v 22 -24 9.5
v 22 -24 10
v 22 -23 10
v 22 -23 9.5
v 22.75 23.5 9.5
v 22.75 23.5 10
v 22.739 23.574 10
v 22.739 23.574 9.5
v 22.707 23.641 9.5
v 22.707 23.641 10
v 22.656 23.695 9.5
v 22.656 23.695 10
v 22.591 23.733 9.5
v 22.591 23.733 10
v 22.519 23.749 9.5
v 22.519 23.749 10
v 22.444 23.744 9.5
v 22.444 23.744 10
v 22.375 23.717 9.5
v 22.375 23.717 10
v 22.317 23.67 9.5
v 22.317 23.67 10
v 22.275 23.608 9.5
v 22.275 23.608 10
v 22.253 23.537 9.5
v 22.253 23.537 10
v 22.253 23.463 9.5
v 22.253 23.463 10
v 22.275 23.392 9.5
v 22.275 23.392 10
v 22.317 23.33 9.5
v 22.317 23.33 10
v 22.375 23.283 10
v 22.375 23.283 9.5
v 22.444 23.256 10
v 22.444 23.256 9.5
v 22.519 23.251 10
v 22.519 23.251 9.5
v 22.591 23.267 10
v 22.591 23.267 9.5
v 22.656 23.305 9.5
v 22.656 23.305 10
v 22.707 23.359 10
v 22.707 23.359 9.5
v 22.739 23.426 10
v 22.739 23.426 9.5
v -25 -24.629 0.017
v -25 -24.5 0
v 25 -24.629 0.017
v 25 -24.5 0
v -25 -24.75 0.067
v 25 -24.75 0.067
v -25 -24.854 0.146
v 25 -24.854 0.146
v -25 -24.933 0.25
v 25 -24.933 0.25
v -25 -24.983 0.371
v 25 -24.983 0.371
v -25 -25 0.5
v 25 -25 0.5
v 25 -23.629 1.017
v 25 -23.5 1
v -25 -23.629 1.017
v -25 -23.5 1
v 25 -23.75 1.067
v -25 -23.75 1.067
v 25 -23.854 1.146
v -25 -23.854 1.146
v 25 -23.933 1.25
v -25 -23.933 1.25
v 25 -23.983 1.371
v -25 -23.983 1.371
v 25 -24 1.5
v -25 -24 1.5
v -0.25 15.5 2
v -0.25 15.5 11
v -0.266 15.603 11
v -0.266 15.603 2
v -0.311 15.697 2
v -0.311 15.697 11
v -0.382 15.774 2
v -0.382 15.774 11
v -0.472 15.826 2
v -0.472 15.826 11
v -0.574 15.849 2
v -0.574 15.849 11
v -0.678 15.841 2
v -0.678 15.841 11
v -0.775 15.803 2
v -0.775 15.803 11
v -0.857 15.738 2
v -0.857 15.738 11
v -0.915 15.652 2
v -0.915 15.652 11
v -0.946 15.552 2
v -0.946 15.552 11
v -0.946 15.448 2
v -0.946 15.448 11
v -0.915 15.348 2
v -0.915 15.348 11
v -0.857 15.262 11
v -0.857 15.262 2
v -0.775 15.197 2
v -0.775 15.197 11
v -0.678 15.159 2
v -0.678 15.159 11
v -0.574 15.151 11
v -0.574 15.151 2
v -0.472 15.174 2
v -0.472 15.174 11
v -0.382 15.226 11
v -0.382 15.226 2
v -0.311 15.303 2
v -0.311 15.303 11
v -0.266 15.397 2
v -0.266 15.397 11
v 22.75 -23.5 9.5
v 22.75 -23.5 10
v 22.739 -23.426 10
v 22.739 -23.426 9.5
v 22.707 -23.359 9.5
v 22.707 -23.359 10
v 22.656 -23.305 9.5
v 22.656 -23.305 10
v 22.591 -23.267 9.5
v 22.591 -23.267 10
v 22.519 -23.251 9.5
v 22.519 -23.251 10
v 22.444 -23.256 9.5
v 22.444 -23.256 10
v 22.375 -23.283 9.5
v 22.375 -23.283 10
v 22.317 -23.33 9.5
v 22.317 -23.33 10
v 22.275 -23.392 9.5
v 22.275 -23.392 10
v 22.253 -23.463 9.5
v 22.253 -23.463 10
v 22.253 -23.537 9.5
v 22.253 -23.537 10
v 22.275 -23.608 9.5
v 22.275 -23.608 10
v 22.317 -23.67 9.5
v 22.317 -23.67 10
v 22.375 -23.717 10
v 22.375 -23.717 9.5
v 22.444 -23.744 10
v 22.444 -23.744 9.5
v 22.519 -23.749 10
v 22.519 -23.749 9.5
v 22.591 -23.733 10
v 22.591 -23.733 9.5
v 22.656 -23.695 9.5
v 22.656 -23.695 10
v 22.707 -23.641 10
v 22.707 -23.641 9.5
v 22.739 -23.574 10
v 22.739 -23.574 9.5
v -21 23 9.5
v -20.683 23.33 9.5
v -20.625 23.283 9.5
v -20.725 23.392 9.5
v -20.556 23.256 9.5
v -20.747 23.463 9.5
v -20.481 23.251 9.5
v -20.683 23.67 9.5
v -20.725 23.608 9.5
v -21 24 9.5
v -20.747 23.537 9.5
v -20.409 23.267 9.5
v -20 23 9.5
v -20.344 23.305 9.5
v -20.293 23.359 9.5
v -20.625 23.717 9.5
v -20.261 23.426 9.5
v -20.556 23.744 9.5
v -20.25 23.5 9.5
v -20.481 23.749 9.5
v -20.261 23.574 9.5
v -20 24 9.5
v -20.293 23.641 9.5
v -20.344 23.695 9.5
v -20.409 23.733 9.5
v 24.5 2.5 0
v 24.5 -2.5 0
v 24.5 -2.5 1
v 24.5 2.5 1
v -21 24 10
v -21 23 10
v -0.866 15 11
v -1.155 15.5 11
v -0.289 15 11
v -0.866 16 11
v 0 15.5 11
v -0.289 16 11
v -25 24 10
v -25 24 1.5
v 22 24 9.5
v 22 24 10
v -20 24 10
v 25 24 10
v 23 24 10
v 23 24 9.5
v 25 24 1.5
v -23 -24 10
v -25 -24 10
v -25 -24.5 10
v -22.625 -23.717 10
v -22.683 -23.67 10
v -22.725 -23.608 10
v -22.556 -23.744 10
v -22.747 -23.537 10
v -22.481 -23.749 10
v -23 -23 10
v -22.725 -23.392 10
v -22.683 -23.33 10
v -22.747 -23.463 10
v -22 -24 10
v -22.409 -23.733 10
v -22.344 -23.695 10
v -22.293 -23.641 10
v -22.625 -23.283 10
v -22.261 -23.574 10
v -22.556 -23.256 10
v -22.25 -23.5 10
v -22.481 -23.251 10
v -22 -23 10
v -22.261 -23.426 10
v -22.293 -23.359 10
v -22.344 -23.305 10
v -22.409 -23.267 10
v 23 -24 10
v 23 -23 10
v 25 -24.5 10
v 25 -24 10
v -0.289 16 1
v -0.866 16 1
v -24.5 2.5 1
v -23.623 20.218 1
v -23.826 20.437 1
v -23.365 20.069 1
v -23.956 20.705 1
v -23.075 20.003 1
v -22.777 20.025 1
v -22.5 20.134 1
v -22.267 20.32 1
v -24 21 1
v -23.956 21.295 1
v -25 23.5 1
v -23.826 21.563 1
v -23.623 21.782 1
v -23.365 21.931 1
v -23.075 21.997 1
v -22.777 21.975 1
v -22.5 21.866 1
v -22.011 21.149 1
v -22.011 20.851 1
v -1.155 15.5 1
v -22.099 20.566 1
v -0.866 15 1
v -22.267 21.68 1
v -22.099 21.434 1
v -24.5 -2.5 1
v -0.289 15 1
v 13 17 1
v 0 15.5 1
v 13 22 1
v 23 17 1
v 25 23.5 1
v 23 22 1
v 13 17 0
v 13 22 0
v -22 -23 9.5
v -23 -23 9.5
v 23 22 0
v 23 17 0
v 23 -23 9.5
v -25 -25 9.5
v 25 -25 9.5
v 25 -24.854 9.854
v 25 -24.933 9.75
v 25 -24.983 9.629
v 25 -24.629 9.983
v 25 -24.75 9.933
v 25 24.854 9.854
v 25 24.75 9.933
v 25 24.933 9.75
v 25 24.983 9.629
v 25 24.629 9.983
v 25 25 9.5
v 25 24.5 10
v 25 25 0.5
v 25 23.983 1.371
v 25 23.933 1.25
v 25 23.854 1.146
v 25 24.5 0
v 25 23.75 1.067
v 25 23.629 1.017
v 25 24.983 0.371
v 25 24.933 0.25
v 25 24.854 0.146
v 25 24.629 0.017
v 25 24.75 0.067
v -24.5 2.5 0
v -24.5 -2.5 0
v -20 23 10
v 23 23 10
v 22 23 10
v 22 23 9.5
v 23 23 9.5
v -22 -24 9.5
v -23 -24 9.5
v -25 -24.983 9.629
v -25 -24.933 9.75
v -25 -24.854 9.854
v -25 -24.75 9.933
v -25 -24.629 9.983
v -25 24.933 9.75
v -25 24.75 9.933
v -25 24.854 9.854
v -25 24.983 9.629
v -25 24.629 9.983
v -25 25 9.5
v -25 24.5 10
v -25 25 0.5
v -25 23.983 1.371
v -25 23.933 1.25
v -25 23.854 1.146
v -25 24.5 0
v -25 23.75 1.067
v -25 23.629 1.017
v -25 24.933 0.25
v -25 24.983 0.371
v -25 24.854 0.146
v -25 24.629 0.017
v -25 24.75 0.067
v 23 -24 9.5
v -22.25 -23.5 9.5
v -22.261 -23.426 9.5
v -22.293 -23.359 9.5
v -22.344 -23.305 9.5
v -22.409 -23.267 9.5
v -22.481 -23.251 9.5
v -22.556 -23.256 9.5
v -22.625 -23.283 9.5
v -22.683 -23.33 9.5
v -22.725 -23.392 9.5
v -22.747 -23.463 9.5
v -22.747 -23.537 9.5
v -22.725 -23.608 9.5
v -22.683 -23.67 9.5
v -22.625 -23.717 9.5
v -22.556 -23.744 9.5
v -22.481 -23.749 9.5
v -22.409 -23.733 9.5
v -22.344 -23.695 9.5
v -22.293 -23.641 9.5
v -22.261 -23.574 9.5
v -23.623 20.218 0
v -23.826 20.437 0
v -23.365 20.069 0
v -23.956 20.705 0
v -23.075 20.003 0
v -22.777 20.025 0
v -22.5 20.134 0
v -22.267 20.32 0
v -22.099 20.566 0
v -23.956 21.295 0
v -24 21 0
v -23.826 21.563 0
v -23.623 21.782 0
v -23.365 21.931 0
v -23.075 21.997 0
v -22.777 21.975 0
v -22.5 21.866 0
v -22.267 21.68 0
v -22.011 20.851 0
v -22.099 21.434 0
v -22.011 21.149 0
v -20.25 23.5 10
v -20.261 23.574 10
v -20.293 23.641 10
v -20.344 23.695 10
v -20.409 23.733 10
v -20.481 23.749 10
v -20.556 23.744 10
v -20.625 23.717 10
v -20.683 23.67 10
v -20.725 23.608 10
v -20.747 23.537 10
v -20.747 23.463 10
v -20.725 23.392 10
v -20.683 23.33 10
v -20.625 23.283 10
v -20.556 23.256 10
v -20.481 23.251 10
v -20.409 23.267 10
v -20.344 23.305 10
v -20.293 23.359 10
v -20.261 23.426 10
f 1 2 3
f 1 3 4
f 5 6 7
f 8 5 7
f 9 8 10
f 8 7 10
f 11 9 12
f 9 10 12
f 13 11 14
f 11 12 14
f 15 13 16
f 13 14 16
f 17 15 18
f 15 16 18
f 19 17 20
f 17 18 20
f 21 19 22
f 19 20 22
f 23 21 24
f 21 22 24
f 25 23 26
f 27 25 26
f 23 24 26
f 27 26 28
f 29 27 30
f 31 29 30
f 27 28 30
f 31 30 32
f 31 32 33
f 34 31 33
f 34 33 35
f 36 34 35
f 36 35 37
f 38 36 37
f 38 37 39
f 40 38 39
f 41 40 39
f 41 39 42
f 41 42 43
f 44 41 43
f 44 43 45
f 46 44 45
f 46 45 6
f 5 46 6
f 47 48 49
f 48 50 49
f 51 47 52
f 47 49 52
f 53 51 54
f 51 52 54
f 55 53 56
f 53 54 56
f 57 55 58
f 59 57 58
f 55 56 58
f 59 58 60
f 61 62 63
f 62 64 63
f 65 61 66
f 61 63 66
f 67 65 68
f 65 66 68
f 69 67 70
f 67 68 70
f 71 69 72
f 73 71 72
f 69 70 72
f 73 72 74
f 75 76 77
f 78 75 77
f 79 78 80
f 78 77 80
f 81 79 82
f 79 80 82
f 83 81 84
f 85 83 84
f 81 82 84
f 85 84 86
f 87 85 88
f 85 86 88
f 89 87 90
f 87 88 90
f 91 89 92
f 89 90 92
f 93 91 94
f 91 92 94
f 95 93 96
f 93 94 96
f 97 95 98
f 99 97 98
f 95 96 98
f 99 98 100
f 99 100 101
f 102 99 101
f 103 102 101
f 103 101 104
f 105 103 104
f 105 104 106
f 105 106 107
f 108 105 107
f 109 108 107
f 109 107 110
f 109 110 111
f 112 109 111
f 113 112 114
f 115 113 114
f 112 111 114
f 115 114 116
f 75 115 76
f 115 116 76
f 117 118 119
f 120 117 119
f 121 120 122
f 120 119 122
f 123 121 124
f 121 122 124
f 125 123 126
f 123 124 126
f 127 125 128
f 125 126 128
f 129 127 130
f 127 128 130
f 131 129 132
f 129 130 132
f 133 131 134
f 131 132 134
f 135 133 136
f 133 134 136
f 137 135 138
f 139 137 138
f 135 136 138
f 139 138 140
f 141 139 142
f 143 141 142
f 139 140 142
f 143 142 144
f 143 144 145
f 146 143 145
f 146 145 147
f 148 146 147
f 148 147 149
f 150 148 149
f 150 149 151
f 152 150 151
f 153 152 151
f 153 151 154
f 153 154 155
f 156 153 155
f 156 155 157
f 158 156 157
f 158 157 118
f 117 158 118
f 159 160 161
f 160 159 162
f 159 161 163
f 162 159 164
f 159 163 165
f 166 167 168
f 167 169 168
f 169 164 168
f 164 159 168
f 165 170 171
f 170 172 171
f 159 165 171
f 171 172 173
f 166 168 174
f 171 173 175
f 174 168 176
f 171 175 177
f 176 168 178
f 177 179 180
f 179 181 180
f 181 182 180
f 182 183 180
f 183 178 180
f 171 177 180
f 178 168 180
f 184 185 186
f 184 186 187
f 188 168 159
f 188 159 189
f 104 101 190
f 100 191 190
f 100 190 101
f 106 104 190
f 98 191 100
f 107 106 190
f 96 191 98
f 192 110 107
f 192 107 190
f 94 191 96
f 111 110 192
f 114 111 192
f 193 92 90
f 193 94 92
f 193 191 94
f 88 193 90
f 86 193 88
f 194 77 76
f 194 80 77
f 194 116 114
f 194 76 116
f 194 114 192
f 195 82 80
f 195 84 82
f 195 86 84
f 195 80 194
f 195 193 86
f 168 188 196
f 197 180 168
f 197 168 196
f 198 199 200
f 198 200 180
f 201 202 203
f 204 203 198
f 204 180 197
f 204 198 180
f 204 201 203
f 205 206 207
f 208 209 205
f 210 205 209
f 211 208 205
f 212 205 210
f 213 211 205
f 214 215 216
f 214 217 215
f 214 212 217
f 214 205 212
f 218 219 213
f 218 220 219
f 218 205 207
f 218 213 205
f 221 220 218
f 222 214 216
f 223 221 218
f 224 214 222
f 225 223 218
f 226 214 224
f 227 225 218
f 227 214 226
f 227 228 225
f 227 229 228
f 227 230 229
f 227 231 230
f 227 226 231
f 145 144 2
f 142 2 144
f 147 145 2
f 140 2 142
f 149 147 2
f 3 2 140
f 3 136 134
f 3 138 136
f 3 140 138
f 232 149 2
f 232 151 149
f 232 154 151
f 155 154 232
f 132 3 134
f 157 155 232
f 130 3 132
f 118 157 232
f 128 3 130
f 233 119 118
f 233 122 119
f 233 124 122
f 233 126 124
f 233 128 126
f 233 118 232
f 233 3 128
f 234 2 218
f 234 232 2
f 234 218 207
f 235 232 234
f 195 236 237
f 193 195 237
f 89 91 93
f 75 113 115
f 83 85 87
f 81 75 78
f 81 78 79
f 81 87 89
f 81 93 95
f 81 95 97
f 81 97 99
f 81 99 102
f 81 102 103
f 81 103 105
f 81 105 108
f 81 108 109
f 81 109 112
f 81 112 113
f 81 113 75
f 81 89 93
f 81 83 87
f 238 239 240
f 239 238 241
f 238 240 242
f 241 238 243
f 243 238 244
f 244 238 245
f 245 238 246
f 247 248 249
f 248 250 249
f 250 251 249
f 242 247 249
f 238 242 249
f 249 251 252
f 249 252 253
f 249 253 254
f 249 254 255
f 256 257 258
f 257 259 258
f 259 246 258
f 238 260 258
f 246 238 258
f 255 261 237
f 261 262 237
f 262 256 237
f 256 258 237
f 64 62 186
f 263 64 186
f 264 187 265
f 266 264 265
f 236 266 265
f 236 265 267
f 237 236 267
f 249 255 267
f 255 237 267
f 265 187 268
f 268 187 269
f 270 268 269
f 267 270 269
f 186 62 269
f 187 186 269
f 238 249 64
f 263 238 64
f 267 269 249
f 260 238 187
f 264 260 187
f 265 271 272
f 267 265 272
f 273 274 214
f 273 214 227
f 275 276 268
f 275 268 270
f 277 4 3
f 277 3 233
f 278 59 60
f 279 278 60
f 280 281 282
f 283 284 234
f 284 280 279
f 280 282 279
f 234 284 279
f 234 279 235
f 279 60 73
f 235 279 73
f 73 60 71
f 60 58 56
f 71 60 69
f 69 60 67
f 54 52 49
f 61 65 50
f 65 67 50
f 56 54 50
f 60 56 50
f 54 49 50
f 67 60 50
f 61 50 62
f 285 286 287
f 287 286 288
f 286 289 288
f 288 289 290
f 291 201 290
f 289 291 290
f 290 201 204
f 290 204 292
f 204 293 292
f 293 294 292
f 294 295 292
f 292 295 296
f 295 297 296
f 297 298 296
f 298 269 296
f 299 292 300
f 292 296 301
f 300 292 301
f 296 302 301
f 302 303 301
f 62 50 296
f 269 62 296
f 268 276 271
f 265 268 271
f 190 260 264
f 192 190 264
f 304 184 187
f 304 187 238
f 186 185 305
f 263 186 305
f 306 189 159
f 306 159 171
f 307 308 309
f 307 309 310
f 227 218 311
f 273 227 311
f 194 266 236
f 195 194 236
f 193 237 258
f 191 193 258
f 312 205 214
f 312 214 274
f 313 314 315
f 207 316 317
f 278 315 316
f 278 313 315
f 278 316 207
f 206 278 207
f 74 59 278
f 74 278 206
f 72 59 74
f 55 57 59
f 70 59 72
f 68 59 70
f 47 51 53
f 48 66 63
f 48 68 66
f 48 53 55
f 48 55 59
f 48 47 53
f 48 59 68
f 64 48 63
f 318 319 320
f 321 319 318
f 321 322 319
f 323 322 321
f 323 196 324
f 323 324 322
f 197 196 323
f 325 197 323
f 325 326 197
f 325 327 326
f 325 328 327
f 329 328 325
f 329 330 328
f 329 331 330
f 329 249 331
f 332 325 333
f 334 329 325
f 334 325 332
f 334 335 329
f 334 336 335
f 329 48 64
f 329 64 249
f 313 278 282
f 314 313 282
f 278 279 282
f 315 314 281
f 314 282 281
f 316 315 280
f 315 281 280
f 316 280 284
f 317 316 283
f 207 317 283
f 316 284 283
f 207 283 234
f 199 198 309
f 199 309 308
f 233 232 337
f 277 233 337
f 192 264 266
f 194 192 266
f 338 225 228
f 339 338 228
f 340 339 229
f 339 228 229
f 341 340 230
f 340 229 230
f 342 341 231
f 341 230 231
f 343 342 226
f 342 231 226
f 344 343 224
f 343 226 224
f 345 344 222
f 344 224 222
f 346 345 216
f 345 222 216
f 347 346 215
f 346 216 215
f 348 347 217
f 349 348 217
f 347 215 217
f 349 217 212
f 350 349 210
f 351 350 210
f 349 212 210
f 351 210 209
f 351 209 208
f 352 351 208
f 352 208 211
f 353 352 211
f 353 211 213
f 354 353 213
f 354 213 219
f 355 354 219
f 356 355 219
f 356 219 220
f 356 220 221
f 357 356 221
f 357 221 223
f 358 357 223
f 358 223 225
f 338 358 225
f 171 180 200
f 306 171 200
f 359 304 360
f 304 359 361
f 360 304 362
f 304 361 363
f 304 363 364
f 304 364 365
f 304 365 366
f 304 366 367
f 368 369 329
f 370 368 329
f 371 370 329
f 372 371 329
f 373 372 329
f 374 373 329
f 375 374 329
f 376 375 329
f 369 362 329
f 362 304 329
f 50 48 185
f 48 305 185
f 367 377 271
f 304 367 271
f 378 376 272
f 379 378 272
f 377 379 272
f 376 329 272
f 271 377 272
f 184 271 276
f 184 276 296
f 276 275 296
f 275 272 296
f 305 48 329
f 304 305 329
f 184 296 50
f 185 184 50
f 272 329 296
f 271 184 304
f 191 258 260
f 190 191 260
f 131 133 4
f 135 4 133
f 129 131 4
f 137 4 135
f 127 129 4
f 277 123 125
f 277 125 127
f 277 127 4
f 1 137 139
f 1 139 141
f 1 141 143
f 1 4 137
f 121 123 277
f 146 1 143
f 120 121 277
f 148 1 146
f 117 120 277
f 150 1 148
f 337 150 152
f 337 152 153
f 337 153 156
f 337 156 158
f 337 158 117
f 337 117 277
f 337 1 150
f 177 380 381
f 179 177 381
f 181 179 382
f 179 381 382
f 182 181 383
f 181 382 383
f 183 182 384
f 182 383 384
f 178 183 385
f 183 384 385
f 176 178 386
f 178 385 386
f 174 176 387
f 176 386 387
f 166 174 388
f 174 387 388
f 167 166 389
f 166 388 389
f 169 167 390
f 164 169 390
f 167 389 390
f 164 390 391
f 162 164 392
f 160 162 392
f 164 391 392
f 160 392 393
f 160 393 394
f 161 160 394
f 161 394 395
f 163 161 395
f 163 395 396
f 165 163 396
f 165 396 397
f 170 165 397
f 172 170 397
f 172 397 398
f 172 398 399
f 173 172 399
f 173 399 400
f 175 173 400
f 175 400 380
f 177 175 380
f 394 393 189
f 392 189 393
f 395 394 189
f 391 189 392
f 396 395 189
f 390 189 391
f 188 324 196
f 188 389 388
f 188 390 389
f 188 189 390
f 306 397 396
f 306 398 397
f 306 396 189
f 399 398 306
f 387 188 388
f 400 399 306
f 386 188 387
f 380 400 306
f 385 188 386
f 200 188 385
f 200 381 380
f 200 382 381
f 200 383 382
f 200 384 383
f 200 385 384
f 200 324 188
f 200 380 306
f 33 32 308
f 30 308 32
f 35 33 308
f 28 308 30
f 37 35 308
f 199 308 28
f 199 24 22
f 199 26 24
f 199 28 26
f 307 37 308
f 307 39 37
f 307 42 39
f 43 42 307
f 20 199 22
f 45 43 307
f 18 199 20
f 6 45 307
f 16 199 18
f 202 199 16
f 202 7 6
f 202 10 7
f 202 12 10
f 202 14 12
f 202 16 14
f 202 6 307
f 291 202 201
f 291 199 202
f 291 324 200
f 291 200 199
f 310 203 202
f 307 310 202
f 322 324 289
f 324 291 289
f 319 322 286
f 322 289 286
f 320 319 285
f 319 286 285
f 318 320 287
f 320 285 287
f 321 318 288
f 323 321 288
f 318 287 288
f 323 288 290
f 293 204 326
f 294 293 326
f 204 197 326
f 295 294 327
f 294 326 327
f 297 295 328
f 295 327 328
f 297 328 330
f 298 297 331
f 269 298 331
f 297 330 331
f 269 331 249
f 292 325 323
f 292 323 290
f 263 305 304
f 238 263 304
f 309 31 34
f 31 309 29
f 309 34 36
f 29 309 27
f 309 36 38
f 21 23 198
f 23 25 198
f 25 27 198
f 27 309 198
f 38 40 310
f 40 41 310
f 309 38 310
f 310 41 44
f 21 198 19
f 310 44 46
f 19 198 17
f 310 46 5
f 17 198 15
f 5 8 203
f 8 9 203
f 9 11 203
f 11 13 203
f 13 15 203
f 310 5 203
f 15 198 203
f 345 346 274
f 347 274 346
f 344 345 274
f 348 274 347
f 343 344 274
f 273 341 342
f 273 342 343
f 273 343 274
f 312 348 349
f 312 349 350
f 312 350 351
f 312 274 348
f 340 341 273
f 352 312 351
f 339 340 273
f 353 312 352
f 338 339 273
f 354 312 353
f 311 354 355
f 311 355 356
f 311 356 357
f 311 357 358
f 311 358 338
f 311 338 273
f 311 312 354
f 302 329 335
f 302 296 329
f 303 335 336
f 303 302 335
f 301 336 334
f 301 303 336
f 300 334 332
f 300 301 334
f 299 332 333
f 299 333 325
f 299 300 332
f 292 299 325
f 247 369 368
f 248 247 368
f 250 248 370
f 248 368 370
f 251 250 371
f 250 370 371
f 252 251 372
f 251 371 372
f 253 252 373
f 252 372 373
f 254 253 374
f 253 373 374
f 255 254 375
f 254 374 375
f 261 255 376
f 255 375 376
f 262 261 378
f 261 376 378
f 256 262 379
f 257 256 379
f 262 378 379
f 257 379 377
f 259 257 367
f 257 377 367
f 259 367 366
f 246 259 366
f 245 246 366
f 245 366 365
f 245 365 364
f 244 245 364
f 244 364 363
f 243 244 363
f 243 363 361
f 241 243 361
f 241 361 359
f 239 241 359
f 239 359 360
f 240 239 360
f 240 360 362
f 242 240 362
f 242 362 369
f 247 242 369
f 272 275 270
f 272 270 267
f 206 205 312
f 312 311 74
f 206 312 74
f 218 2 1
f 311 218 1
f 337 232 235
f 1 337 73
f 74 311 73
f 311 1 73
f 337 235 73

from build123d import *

# Parameters (mm, degrees)
CROQUIS1_W              = 50
CROQUIS1_H              = 50
SALIENTE_EXTRUIR1_DEPTH = 10
CROQUIS2_W              = 49
CROQUIS2_H              = 5
CORTAR_EXTRUIR2_DEPTH   = 6
CROQUIS3_W              = 10
CROQUIS3_H              = 5
CORTAR_EXTRUIR3_DEPTH   = 6
CROQUIS4_R              = 1
CORTAR_EXTRUIR4_DEPTH   = 6
CROQUIS5_W              = 9
CROQUIS5_H              = 48
CORTAR_EXTRUIR5_DEPTH   = 50
CROQUIS6_W              = 1
CROQUIS6_H              = 0.5
SALIENTE_EXTRUIR2_DEPTH = 1
CROQUIS7_W              = 1
CROQUIS7_H              = 0.5
SALIENTE_EXTRUIR3_DEPTH = 1
CROQUIS9_W              = 1
CROQUIS9_H              = 0.5
SALIENTE_EXTRUIR4_DEPTH = 1
CROQUIS10_W             = 1
CROQUIS10_H             = 0.5
SALIENTE_EXTRUIR5_DEPTH = 1
SALIENTE_EXTRUIR6_DEPTH = 10
CROQUIS12_R             = 0.35
CORTAR_EXTRUIR6_DEPTH   = 9
CROQUIS13_R             = 0.25
CORTAR_EXTRUIR7_DEPTH   = 2
CROQUIS14_R             = 0.25
CORTAR_EXTRUIR8_DEPTH   = 2
CROQUIS15_R             = 0.25
CORTAR_EXTRUIR9_DEPTH   = 2
CROQUIS16_R             = 0.25
CORTAR_EXTRUIR10_DEPTH  = 2
REDONDEO5_R             = 0.5
REDONDEO6_R             = 0.5
REDONDEO7_R             = 0.5
REDONDEO8_R             = 0.5
REDONDEO9_R             = 0.5
REDONDEO10_R            = 0.5


with BuildPart() as part:
    # Croquis1 → Saliente-Extruir1 (new body)
    with BuildSketch(Plane.XY):
        Rectangle(CROQUIS1_W, CROQUIS1_H)
    extrude(amount=SALIENTE_EXTRUIR1_DEPTH)

    # Croquis2 → Cortar-Extruir2 (cut)
    with BuildSketch(Plane(origin=(0, 0, 0), x_dir=(-1, 0, 0), z_dir=(0, 0, -1))):
        Rectangle(CROQUIS2_W, CROQUIS2_H)
    extrude(amount=-CORTAR_EXTRUIR2_DEPTH, mode=Mode.SUBTRACT)

    # Croquis3 → Cortar-Extruir3 (cut)
    with BuildSketch(Plane(origin=(0, 0, 0), x_dir=(-1, 0, 0), z_dir=(0, 0, -1))):
        with Locations((-18, 19.5)):
            Rectangle(CROQUIS3_W, CROQUIS3_H)
    extrude(amount=-CORTAR_EXTRUIR3_DEPTH, mode=Mode.SUBTRACT)

    # Croquis4 → Cortar-Extruir4 (cut)
    with BuildSketch(Plane(origin=(0, 0, 0), x_dir=(-1, 0, 0), z_dir=(0, 0, -1))):
        with Locations((23, 21)):
            Circle(CROQUIS4_R)
    extrude(amount=-CORTAR_EXTRUIR4_DEPTH, mode=Mode.SUBTRACT)

    # Croquis5 → Cortar-Extruir5 (cut)
    with BuildSketch(Plane(origin=(25, 0, 0), x_dir=(0, 0, -1), z_dir=(1, 0, 0))):
        with Locations((-5.5, 0)):
            Rectangle(CROQUIS5_W, CROQUIS5_H)
    extrude(amount=-CORTAR_EXTRUIR5_DEPTH, mode=Mode.SUBTRACT)

    # Croquis6 → Saliente-Extruir2 (add)
    with BuildSketch(Plane.XZ.offset(-24)):
        with Locations((-20.5, 9.75)):
            Rectangle(CROQUIS6_W, CROQUIS6_H)
    extrude(amount=SALIENTE_EXTRUIR2_DEPTH)

    # Croquis7 → Saliente-Extruir3 (add)
    with BuildSketch(Plane.XZ.offset(-24)):
        with Locations((22.5, 9.75)):
            Rectangle(CROQUIS7_W, CROQUIS7_H)
    extrude(amount=SALIENTE_EXTRUIR3_DEPTH)

    # Croquis9 → Saliente-Extruir4 (add)
    with BuildSketch(Plane(origin=(0, -24, 0), x_dir=(1, 0, 0), z_dir=(0, 1, 0))):
        with Locations((-22.5, -9.75)):
            Rectangle(CROQUIS9_W, CROQUIS9_H)
    extrude(amount=SALIENTE_EXTRUIR4_DEPTH)

    # Croquis10 → Saliente-Extruir5 (add)
    with BuildSketch(Plane(origin=(0, -24, 0), x_dir=(1, 0, 0), z_dir=(0, 1, 0))):
        with Locations((22.5, -9.75)):
            Rectangle(CROQUIS10_W, CROQUIS10_H)
    extrude(amount=SALIENTE_EXTRUIR5_DEPTH)

    # Croquis11 → Saliente-Extruir6 (add)
    with BuildSketch(Plane.XY.offset(1)):
        Polygon((0, 15.5), (-0.288675135, 16), (-0.866025404, 16), (-1.154700538, 15.5), (-0.866025404, 15), (-0.288675135, 15), align=None)
    extrude(amount=SALIENTE_EXTRUIR6_DEPTH)

    # Croquis12 → Cortar-Extruir6 (cut)
    with BuildSketch(Plane.XY.offset(11)):
        with Locations((-0.6, 15.5)):
            Circle(CROQUIS12_R)
    extrude(amount=-CORTAR_EXTRUIR6_DEPTH, mode=Mode.SUBTRACT)

    # Croquis13 → Cortar-Extruir7 (cut)
    with BuildSketch(Plane.XY.offset(10)):
        with Locations((-20.5, 23.5)):
            Circle(CROQUIS13_R)
    extrude(amount=-CORTAR_EXTRUIR7_DEPTH, mode=Mode.SUBTRACT)

    # Croquis14 → Cortar-Extruir8 (cut)
    with BuildSketch(Plane.XY.offset(10)):
        with Locations((22.5, 23.5)):
            Circle(CROQUIS14_R)
    extrude(amount=-CORTAR_EXTRUIR8_DEPTH, mode=Mode.SUBTRACT)

    # Croquis15 → Cortar-Extruir9 (cut)
    with BuildSketch(Plane.XY.offset(10)):
        with Locations((-22.5, -23.5)):
            Circle(CROQUIS15_R)
    extrude(amount=-CORTAR_EXTRUIR9_DEPTH, mode=Mode.SUBTRACT)

    # Croquis16 → Cortar-Extruir10 (cut)
    with BuildSketch(Plane.XY.offset(10)):
        with Locations((22.5, -23.5)):
            Circle(CROQUIS16_R)
    extrude(amount=-CORTAR_EXTRUIR10_DEPTH, mode=Mode.SUBTRACT)

    # Redondeo5
    redondeo5_edges = [part.edges().sort_by_distance(p)[0] for p in [
        (0, 25, 0),
    ]]
    fillet(redondeo5_edges, radius=REDONDEO5_R)

    # Redondeo6
    redondeo6_edges = [part.edges().sort_by_distance(p)[0] for p in [
        (0, -25, 0),
    ]]
    fillet(redondeo6_edges, radius=REDONDEO6_R)

    # Redondeo7
    redondeo7_edges = [part.edges().sort_by_distance(p)[0] for p in [
        (0, 24, 1),
    ]]
    fillet(redondeo7_edges, radius=REDONDEO7_R)

    # Redondeo8
    redondeo8_edges = [part.edges().sort_by_distance(p)[0] for p in [
        (0, -24, 1),
    ]]
    fillet(redondeo8_edges, radius=REDONDEO8_R)

    # Redondeo9
    redondeo9_edges = [part.edges().sort_by_distance(p)[0] for p in [
        (0, 25, 10),
    ]]
    fillet(redondeo9_edges, radius=REDONDEO9_R)

    # Redondeo10
    redondeo10_edges = [part.edges().sort_by_distance(p)[0] for p in [
        (0, -25, 10),
    ]]
    fillet(redondeo10_edges, radius=REDONDEO10_R)


solid = part.part
